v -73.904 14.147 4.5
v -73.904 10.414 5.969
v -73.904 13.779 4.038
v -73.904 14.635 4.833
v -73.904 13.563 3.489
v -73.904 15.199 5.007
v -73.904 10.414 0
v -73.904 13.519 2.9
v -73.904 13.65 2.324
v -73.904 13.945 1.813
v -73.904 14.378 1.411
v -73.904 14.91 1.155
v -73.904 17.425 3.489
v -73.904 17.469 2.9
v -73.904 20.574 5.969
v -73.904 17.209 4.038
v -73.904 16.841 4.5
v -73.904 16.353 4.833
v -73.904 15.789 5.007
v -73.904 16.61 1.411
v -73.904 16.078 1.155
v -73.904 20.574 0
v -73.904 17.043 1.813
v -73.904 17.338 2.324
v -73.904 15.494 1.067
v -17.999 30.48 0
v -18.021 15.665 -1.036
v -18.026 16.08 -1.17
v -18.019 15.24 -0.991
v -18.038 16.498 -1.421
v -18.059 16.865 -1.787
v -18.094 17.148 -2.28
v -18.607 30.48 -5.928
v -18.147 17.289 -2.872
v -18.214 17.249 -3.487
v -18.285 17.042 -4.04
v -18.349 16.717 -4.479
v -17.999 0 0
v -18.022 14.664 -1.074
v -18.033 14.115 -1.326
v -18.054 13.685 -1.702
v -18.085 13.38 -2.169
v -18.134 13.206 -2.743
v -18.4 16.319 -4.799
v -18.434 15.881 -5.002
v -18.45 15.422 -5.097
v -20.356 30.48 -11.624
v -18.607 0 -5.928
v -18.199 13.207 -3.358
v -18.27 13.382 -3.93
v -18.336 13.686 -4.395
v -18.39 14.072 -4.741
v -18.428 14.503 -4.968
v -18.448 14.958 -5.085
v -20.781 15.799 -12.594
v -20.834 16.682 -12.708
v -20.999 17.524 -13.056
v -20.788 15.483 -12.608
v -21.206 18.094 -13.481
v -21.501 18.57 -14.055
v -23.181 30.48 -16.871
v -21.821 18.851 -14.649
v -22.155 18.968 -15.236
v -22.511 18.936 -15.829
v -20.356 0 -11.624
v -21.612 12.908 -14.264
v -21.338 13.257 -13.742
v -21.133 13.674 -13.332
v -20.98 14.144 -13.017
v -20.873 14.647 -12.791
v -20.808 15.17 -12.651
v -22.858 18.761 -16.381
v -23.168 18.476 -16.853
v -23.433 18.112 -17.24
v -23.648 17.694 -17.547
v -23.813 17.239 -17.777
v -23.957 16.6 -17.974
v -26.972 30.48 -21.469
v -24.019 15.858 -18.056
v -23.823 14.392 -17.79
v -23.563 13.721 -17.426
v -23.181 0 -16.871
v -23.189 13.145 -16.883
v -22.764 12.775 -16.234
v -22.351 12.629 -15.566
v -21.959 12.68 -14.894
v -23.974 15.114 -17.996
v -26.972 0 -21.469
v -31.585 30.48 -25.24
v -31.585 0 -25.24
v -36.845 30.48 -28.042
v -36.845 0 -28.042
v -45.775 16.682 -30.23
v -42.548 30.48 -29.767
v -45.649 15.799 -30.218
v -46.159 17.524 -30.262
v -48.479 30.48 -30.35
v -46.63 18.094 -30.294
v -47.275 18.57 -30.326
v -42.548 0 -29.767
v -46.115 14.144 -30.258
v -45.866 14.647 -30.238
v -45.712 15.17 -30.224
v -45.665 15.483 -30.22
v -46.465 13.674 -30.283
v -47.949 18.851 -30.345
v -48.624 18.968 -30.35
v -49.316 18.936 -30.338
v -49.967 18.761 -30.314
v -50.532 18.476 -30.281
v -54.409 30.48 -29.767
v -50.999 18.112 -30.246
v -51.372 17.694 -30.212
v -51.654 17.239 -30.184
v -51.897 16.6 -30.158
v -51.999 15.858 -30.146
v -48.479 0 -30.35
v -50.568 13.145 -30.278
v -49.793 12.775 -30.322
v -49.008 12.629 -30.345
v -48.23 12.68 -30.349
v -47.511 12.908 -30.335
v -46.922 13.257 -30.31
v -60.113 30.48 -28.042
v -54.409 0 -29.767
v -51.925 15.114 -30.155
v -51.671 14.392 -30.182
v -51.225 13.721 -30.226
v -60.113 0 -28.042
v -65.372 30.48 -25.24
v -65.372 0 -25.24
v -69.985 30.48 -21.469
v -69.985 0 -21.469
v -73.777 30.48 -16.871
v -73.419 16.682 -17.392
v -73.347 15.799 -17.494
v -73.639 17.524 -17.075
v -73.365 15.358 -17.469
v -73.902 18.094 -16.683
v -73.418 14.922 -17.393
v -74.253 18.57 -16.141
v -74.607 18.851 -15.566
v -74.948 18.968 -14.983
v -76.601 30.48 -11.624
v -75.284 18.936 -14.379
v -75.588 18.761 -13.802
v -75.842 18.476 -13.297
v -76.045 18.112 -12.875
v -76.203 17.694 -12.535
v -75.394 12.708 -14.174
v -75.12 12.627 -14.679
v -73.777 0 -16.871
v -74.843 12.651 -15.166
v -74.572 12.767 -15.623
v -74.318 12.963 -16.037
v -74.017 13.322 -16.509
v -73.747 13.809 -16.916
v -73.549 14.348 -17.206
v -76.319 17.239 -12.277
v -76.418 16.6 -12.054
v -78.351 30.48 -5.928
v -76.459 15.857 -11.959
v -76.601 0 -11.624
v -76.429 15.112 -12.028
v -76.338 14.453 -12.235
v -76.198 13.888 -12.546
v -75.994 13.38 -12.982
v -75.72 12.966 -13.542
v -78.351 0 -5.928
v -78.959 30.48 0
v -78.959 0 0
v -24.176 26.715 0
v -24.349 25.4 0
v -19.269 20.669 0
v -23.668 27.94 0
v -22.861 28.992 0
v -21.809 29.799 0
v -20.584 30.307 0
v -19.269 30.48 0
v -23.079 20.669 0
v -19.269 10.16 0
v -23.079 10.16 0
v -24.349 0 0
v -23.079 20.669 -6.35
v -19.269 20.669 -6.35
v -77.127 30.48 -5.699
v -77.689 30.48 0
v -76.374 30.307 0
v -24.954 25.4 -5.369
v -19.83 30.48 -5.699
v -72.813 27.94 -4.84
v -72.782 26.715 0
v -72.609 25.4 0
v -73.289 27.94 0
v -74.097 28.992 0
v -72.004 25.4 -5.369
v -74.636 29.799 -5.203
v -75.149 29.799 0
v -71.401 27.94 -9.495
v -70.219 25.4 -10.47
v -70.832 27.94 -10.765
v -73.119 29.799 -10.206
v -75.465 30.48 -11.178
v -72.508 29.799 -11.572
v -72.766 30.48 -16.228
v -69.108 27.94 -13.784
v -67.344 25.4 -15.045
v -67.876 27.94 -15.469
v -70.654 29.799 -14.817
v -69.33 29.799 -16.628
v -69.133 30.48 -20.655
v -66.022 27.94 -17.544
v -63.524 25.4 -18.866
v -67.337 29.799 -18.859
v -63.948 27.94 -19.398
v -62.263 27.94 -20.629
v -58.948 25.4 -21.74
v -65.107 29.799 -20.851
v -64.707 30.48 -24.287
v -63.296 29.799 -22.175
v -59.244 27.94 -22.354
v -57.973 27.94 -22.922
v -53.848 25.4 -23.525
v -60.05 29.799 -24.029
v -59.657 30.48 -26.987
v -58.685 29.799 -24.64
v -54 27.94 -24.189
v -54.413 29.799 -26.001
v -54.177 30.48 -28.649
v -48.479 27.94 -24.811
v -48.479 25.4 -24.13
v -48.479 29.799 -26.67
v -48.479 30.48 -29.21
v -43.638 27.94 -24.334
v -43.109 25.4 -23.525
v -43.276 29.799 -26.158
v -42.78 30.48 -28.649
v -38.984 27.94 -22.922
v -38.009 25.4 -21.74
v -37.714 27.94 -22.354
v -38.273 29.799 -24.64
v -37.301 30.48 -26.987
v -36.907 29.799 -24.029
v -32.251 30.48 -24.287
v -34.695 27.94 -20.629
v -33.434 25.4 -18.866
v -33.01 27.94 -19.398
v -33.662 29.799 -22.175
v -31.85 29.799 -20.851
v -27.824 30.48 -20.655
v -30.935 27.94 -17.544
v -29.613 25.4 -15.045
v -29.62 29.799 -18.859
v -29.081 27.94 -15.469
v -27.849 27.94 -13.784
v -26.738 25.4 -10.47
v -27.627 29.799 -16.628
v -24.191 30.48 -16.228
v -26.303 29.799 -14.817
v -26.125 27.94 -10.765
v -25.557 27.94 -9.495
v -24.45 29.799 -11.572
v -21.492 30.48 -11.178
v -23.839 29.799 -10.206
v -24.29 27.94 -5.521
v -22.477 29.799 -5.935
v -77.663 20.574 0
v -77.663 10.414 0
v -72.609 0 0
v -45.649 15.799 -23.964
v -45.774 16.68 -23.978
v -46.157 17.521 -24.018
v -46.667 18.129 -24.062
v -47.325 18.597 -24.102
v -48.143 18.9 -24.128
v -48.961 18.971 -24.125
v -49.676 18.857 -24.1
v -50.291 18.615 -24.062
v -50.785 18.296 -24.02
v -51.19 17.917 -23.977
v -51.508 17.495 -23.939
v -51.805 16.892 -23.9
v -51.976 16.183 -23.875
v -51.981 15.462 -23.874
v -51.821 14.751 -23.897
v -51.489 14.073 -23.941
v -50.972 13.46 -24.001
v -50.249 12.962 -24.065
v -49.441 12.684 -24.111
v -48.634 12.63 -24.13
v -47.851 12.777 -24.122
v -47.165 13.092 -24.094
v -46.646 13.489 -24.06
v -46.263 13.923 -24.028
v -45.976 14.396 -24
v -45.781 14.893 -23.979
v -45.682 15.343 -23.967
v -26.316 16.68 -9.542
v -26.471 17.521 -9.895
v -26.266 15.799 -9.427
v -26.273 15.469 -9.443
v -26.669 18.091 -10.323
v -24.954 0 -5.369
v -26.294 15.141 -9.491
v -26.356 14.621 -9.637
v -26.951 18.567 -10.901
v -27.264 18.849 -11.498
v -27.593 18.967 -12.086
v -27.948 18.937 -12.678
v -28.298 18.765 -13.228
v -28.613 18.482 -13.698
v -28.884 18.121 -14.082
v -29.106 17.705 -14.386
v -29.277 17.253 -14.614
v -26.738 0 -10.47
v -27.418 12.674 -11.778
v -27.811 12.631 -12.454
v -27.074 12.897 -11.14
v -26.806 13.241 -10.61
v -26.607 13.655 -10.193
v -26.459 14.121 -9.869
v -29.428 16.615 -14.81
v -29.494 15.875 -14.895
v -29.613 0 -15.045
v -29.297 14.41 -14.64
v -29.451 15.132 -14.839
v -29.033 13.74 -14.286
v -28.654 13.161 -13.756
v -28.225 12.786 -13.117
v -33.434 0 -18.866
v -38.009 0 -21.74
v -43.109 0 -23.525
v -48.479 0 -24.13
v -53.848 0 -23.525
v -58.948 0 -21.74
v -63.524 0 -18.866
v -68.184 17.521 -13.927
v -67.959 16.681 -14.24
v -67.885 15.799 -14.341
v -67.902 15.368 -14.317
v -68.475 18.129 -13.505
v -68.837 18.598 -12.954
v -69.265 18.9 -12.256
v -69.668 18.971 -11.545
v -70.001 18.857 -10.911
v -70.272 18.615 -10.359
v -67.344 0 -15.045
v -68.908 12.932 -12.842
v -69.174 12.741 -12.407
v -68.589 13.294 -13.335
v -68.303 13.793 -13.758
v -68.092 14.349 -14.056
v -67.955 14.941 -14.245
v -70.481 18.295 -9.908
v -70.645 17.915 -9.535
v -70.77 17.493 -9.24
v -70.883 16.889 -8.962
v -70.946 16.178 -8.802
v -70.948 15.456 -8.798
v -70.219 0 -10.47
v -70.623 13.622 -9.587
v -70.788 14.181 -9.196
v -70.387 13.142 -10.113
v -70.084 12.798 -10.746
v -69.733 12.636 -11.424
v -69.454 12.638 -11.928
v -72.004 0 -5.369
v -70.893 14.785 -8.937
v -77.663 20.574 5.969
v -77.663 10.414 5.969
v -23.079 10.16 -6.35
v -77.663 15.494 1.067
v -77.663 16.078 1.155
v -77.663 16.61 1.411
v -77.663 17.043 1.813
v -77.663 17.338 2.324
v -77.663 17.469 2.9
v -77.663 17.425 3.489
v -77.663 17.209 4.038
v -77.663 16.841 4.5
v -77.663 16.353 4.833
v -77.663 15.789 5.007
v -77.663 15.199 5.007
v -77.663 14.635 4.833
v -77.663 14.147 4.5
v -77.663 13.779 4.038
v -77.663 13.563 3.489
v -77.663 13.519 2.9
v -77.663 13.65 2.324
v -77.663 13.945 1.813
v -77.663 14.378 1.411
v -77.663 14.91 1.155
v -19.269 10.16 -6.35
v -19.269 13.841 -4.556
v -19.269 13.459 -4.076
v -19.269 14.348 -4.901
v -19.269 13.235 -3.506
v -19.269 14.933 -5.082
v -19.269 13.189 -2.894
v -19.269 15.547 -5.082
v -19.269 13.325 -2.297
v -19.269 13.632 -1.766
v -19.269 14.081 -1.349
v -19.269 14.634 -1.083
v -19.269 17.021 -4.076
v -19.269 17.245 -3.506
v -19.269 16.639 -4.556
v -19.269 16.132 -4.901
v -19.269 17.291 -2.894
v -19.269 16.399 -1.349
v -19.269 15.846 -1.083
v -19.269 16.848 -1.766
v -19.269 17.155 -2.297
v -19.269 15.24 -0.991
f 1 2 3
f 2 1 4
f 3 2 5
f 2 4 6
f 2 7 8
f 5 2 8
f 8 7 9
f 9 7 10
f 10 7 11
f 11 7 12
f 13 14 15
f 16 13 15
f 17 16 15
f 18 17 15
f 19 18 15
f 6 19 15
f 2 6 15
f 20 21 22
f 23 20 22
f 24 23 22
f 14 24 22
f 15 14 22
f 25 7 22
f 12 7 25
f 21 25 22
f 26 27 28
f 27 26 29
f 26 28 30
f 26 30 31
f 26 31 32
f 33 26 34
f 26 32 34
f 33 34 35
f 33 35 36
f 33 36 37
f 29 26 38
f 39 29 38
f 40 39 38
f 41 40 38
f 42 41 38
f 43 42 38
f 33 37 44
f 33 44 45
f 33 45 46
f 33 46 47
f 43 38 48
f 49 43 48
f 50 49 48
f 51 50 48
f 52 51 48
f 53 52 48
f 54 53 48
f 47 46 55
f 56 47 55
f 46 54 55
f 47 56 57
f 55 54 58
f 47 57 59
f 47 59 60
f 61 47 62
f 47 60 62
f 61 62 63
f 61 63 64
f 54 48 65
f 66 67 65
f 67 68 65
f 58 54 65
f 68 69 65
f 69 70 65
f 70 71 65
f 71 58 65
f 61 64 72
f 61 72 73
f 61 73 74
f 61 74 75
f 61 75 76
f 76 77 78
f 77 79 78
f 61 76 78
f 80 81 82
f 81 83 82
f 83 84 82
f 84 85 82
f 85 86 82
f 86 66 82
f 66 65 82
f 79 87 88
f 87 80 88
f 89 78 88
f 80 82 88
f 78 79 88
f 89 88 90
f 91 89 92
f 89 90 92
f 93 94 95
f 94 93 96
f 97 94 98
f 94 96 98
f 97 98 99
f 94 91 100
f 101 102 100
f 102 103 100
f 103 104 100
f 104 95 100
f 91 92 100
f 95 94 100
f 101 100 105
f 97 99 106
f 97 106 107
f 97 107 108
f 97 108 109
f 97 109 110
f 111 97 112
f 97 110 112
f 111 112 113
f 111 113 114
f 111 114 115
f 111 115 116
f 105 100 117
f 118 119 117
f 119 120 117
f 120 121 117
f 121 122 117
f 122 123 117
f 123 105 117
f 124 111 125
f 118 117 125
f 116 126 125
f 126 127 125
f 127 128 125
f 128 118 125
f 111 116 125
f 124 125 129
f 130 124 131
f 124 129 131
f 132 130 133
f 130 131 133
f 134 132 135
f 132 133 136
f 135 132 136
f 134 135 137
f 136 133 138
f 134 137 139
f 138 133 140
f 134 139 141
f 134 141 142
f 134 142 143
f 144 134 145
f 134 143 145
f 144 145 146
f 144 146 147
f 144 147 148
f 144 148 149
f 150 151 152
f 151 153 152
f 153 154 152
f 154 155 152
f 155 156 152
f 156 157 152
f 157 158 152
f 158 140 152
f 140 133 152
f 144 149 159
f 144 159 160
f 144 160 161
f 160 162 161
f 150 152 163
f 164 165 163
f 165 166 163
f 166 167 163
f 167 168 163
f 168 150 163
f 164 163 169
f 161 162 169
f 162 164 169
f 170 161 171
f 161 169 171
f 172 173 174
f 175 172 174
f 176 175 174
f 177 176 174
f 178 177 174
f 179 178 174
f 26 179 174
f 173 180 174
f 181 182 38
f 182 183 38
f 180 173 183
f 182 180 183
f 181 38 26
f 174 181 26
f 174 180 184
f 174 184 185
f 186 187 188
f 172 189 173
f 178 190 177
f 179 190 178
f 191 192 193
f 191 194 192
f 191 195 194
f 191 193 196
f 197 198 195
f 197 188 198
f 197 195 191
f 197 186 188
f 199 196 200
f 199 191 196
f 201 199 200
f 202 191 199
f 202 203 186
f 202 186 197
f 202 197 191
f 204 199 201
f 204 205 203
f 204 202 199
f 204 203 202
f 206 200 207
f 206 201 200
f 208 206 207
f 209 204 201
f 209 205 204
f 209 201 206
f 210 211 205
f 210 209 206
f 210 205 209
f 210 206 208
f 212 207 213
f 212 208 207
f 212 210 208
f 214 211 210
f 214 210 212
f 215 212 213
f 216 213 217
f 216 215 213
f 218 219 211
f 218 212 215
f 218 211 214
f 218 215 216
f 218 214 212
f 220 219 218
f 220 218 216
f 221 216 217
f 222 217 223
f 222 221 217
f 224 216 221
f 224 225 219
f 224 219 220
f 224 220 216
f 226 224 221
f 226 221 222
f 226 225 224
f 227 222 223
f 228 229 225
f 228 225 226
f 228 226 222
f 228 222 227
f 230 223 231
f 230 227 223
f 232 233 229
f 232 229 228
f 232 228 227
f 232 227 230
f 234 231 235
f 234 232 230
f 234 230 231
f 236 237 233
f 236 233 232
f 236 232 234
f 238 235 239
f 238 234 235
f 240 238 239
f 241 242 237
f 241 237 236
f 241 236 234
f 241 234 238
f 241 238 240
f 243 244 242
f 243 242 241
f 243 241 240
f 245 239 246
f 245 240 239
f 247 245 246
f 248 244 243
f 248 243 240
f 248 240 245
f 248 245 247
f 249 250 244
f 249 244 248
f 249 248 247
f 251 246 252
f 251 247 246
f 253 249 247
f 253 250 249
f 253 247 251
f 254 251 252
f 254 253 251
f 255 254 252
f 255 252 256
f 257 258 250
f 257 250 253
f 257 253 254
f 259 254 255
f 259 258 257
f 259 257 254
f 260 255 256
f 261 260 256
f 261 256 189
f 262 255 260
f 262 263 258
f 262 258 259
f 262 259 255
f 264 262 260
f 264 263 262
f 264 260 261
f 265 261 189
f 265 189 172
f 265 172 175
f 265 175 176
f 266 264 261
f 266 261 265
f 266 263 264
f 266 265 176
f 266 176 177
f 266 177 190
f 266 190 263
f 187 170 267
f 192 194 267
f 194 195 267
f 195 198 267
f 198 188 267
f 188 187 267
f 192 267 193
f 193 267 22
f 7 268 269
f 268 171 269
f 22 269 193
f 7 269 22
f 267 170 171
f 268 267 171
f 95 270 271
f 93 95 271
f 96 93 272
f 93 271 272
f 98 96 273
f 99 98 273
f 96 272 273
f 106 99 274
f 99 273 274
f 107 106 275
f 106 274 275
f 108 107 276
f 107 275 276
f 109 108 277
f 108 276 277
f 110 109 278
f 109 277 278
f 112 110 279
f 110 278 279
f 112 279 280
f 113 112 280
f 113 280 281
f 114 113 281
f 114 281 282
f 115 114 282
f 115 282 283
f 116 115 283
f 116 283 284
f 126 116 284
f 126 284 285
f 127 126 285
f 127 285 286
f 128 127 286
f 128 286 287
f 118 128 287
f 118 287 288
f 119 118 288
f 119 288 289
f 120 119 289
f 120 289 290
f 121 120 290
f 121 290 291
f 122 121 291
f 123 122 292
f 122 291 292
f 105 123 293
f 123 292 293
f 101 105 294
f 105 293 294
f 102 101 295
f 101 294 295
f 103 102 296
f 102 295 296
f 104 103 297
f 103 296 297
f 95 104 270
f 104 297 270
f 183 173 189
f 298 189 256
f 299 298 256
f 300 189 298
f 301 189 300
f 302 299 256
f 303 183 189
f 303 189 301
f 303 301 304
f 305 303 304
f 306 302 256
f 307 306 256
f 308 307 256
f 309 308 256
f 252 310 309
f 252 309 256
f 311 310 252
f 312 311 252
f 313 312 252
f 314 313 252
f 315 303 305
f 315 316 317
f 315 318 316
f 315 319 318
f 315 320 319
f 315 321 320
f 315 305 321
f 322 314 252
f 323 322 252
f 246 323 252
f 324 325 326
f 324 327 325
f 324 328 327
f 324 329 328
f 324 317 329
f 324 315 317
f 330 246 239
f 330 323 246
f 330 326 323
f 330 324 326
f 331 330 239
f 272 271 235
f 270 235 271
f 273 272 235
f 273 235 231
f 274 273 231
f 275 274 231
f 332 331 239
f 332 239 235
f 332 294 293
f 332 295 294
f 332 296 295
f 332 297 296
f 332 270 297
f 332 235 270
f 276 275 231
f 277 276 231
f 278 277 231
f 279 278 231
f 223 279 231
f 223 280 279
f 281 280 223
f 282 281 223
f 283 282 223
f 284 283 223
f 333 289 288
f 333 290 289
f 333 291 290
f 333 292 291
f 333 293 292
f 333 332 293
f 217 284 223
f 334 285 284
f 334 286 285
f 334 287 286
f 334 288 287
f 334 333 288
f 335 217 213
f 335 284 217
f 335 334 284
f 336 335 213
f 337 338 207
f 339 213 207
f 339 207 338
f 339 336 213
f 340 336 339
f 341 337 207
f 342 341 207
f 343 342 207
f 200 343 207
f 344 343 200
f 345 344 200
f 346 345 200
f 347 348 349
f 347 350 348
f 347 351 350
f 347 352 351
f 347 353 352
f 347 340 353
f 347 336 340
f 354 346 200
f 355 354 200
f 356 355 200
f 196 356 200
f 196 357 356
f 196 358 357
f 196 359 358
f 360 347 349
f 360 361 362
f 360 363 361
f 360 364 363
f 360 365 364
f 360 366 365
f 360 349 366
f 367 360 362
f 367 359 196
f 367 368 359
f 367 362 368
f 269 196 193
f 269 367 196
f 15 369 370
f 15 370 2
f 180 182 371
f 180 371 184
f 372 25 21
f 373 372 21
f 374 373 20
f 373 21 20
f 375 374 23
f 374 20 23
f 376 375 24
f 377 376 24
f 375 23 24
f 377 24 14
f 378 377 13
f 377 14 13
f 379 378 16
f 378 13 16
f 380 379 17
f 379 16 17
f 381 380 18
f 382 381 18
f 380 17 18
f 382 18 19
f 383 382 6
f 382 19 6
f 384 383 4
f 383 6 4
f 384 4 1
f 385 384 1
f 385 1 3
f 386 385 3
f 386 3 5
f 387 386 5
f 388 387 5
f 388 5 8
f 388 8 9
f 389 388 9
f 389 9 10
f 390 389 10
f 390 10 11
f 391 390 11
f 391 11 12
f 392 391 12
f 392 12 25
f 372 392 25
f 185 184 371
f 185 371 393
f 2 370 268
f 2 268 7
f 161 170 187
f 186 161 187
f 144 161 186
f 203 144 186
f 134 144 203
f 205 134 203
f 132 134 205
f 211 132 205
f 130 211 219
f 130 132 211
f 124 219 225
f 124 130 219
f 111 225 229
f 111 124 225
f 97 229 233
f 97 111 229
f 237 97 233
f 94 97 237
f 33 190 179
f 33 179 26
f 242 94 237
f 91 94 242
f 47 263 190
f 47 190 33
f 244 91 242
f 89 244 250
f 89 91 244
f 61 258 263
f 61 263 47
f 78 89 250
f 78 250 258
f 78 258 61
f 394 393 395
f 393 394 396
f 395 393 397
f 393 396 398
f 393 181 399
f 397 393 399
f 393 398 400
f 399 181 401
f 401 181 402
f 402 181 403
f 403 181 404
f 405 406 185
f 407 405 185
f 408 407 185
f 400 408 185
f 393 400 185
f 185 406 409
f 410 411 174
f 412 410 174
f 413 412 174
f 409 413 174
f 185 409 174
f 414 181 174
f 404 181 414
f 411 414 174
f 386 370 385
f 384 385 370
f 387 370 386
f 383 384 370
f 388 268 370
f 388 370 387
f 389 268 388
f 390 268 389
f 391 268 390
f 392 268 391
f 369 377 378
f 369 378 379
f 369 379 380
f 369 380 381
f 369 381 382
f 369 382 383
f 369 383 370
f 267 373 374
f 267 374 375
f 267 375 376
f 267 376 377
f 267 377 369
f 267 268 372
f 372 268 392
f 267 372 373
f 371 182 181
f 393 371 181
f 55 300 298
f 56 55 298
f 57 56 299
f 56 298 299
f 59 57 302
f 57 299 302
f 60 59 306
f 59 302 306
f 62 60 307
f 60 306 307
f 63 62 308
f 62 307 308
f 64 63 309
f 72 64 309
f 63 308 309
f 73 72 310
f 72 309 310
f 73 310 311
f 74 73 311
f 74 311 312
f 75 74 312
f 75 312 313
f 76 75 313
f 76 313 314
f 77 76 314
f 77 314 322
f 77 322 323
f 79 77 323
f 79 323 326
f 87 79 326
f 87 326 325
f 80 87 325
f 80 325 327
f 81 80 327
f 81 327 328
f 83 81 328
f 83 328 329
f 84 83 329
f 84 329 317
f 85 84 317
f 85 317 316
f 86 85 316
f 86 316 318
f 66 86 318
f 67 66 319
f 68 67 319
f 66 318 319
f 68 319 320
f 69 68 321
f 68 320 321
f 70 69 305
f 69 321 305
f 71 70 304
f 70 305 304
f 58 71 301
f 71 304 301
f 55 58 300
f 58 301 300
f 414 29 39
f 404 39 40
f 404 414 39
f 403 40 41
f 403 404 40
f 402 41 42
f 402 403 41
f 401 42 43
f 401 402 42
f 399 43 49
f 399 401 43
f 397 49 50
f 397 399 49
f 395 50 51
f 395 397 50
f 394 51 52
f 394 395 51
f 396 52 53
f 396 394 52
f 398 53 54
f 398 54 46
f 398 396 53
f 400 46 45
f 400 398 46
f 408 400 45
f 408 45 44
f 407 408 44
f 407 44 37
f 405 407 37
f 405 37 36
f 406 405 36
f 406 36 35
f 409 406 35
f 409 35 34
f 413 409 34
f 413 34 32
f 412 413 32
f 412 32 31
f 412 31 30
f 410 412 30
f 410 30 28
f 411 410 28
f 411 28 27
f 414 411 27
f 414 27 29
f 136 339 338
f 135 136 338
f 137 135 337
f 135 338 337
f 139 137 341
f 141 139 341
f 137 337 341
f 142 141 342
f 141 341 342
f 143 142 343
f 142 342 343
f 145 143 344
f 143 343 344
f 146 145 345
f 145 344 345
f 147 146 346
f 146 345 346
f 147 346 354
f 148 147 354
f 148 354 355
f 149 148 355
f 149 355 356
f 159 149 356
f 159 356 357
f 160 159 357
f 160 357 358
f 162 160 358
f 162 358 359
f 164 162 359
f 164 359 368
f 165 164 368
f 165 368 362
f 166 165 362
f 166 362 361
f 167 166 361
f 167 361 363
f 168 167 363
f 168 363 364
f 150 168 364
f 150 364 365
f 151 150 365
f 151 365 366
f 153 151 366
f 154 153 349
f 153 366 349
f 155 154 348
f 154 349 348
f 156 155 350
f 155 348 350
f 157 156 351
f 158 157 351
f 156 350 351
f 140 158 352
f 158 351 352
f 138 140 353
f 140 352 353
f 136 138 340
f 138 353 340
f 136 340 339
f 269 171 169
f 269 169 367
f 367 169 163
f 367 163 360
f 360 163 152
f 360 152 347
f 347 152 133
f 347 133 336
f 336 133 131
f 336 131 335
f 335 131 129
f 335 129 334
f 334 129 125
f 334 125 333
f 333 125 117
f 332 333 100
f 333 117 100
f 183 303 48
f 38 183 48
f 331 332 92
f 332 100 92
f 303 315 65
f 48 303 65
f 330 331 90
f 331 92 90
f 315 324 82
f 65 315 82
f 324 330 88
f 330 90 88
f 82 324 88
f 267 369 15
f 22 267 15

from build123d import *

# Parameters (mm, degrees)
BOSS_EXTRUDE1_DEPTH = 30.48
SKETCH3_R           = 24.13
CUT_EXTRUDE4_DEPTH  = 90.914560616
SKETCH4_R           = 3.175
CUT_EXTRUDE5_DEPTH  = 63.754
CIRPATTERN3_COUNT   = 6
SKETCH6_W           = 3.81
SKETCH6_H           = 10.509433013
CUT_EXTRUDE6_DEPTH  = 6.35
SKETCH7_W           = 3.7592
SKETCH7_H           = 10.16
BOSS_EXTRUDE4_DEPTH = 5.969
SKETCH8_R           = 1.980775352
CUT_EXTRUDE7_DEPTH  = 5.969
SKETCH9_R           = 2.056796453
CUT_EXTRUDE8_DEPTH  = 12.319
FILLET4_R           = 5.08


with BuildPart() as part:
    # Sketch1 → Boss-Extrude1 (new body)
    with BuildSketch(Plane(origin=(0, 0, 0), x_dir=(1, 0, 0), z_dir=(0, 1, 0))):
        with BuildLine():
            Line((-78.958715675, 0), (-17.998715675, 0))
            ThreePointArc((-17.998715675, 0), (-48.478715675, 30.349942827), (-78.958715675, 0))
        make_face()
    extrude(amount=BOSS_EXTRUDE1_DEPTH)

    # Sketch3 → Cut-Extrude4 (cut, through all)
    with BuildSketch(Plane(origin=(0, 0, 0), x_dir=(1, 0, 0), z_dir=(0, 1, 0))):
        with Locations((-48.478715675, 0)):
            Circle(SKETCH3_R)
    extrude(amount=CUT_EXTRUDE4_DEPTH, mode=Mode.SUBTRACT)

    # Sketch4 → Cut-Extrude5 (cut)
    with BuildSketch(Plane.XY):
        with Locations((-48.824364134, 15.798935299)):
            Circle(SKETCH4_R)
    cut_extrude5 = extrude(amount=-CUT_EXTRUDE5_DEPTH, mode=Mode.SUBTRACT)

    # CirPattern3: Cut-Extrude5 ×6 about axis
    cirpattern3_axis = Axis((-48.478715675, 30.48, 0.130335837), (0, -1, 0))
    for i in range(1, CIRPATTERN3_COUNT):
        add(cut_extrude5.rotate(cirpattern3_axis, i * 360 / CIRPATTERN3_COUNT), mode=Mode.SUBTRACT)

    # Sketch6 → Cut-Extrude6 (cut)
    with BuildSketch(Plane.XY):
        with Locations((-21.173715675, 15.414716507)):
            Rectangle(SKETCH6_W, SKETCH6_H)
    extrude(amount=-CUT_EXTRUDE6_DEPTH, mode=Mode.SUBTRACT)

    # Sketch7 → Boss-Extrude4 (add)
    with BuildSketch(Plane.XY):
        with Locations((-75.783715675, 15.494)):
            Rectangle(SKETCH7_W, SKETCH7_H)
    extrude(amount=BOSS_EXTRUDE4_DEPTH)

    # Sketch8 → Cut-Extrude7 (cut)
    with BuildSketch(Plane(origin=(-73.904115675, 0, 0), x_dir=(0, 0, -1), z_dir=(1, 0, 0))):
        with Locations((-3.048, 15.494)):
            Circle(SKETCH8_R)
    extrude(amount=-CUT_EXTRUDE7_DEPTH, mode=Mode.SUBTRACT)

    # Sketch9 → Cut-Extrude8 (cut)
    with BuildSketch(Plane(origin=(-23.078715675, 0, 0), x_dir=(0, 0, -1), z_dir=(1, 0, 0))):
        with Locations(Location((3.048, 15.24, 0), (0, 0, 180))):
            Circle(SKETCH9_R)
    extrude(amount=CUT_EXTRUDE8_DEPTH, mode=Mode.SUBTRACT)

    # Fillet4
    fillet4_edges = [part.edges().sort_by_distance(p)[0] for p in [
        (-48.478715675, 30.48, -24.13),
    ]]
    fillet(fillet4_edges, radius=FILLET4_R)


solid = part.part
